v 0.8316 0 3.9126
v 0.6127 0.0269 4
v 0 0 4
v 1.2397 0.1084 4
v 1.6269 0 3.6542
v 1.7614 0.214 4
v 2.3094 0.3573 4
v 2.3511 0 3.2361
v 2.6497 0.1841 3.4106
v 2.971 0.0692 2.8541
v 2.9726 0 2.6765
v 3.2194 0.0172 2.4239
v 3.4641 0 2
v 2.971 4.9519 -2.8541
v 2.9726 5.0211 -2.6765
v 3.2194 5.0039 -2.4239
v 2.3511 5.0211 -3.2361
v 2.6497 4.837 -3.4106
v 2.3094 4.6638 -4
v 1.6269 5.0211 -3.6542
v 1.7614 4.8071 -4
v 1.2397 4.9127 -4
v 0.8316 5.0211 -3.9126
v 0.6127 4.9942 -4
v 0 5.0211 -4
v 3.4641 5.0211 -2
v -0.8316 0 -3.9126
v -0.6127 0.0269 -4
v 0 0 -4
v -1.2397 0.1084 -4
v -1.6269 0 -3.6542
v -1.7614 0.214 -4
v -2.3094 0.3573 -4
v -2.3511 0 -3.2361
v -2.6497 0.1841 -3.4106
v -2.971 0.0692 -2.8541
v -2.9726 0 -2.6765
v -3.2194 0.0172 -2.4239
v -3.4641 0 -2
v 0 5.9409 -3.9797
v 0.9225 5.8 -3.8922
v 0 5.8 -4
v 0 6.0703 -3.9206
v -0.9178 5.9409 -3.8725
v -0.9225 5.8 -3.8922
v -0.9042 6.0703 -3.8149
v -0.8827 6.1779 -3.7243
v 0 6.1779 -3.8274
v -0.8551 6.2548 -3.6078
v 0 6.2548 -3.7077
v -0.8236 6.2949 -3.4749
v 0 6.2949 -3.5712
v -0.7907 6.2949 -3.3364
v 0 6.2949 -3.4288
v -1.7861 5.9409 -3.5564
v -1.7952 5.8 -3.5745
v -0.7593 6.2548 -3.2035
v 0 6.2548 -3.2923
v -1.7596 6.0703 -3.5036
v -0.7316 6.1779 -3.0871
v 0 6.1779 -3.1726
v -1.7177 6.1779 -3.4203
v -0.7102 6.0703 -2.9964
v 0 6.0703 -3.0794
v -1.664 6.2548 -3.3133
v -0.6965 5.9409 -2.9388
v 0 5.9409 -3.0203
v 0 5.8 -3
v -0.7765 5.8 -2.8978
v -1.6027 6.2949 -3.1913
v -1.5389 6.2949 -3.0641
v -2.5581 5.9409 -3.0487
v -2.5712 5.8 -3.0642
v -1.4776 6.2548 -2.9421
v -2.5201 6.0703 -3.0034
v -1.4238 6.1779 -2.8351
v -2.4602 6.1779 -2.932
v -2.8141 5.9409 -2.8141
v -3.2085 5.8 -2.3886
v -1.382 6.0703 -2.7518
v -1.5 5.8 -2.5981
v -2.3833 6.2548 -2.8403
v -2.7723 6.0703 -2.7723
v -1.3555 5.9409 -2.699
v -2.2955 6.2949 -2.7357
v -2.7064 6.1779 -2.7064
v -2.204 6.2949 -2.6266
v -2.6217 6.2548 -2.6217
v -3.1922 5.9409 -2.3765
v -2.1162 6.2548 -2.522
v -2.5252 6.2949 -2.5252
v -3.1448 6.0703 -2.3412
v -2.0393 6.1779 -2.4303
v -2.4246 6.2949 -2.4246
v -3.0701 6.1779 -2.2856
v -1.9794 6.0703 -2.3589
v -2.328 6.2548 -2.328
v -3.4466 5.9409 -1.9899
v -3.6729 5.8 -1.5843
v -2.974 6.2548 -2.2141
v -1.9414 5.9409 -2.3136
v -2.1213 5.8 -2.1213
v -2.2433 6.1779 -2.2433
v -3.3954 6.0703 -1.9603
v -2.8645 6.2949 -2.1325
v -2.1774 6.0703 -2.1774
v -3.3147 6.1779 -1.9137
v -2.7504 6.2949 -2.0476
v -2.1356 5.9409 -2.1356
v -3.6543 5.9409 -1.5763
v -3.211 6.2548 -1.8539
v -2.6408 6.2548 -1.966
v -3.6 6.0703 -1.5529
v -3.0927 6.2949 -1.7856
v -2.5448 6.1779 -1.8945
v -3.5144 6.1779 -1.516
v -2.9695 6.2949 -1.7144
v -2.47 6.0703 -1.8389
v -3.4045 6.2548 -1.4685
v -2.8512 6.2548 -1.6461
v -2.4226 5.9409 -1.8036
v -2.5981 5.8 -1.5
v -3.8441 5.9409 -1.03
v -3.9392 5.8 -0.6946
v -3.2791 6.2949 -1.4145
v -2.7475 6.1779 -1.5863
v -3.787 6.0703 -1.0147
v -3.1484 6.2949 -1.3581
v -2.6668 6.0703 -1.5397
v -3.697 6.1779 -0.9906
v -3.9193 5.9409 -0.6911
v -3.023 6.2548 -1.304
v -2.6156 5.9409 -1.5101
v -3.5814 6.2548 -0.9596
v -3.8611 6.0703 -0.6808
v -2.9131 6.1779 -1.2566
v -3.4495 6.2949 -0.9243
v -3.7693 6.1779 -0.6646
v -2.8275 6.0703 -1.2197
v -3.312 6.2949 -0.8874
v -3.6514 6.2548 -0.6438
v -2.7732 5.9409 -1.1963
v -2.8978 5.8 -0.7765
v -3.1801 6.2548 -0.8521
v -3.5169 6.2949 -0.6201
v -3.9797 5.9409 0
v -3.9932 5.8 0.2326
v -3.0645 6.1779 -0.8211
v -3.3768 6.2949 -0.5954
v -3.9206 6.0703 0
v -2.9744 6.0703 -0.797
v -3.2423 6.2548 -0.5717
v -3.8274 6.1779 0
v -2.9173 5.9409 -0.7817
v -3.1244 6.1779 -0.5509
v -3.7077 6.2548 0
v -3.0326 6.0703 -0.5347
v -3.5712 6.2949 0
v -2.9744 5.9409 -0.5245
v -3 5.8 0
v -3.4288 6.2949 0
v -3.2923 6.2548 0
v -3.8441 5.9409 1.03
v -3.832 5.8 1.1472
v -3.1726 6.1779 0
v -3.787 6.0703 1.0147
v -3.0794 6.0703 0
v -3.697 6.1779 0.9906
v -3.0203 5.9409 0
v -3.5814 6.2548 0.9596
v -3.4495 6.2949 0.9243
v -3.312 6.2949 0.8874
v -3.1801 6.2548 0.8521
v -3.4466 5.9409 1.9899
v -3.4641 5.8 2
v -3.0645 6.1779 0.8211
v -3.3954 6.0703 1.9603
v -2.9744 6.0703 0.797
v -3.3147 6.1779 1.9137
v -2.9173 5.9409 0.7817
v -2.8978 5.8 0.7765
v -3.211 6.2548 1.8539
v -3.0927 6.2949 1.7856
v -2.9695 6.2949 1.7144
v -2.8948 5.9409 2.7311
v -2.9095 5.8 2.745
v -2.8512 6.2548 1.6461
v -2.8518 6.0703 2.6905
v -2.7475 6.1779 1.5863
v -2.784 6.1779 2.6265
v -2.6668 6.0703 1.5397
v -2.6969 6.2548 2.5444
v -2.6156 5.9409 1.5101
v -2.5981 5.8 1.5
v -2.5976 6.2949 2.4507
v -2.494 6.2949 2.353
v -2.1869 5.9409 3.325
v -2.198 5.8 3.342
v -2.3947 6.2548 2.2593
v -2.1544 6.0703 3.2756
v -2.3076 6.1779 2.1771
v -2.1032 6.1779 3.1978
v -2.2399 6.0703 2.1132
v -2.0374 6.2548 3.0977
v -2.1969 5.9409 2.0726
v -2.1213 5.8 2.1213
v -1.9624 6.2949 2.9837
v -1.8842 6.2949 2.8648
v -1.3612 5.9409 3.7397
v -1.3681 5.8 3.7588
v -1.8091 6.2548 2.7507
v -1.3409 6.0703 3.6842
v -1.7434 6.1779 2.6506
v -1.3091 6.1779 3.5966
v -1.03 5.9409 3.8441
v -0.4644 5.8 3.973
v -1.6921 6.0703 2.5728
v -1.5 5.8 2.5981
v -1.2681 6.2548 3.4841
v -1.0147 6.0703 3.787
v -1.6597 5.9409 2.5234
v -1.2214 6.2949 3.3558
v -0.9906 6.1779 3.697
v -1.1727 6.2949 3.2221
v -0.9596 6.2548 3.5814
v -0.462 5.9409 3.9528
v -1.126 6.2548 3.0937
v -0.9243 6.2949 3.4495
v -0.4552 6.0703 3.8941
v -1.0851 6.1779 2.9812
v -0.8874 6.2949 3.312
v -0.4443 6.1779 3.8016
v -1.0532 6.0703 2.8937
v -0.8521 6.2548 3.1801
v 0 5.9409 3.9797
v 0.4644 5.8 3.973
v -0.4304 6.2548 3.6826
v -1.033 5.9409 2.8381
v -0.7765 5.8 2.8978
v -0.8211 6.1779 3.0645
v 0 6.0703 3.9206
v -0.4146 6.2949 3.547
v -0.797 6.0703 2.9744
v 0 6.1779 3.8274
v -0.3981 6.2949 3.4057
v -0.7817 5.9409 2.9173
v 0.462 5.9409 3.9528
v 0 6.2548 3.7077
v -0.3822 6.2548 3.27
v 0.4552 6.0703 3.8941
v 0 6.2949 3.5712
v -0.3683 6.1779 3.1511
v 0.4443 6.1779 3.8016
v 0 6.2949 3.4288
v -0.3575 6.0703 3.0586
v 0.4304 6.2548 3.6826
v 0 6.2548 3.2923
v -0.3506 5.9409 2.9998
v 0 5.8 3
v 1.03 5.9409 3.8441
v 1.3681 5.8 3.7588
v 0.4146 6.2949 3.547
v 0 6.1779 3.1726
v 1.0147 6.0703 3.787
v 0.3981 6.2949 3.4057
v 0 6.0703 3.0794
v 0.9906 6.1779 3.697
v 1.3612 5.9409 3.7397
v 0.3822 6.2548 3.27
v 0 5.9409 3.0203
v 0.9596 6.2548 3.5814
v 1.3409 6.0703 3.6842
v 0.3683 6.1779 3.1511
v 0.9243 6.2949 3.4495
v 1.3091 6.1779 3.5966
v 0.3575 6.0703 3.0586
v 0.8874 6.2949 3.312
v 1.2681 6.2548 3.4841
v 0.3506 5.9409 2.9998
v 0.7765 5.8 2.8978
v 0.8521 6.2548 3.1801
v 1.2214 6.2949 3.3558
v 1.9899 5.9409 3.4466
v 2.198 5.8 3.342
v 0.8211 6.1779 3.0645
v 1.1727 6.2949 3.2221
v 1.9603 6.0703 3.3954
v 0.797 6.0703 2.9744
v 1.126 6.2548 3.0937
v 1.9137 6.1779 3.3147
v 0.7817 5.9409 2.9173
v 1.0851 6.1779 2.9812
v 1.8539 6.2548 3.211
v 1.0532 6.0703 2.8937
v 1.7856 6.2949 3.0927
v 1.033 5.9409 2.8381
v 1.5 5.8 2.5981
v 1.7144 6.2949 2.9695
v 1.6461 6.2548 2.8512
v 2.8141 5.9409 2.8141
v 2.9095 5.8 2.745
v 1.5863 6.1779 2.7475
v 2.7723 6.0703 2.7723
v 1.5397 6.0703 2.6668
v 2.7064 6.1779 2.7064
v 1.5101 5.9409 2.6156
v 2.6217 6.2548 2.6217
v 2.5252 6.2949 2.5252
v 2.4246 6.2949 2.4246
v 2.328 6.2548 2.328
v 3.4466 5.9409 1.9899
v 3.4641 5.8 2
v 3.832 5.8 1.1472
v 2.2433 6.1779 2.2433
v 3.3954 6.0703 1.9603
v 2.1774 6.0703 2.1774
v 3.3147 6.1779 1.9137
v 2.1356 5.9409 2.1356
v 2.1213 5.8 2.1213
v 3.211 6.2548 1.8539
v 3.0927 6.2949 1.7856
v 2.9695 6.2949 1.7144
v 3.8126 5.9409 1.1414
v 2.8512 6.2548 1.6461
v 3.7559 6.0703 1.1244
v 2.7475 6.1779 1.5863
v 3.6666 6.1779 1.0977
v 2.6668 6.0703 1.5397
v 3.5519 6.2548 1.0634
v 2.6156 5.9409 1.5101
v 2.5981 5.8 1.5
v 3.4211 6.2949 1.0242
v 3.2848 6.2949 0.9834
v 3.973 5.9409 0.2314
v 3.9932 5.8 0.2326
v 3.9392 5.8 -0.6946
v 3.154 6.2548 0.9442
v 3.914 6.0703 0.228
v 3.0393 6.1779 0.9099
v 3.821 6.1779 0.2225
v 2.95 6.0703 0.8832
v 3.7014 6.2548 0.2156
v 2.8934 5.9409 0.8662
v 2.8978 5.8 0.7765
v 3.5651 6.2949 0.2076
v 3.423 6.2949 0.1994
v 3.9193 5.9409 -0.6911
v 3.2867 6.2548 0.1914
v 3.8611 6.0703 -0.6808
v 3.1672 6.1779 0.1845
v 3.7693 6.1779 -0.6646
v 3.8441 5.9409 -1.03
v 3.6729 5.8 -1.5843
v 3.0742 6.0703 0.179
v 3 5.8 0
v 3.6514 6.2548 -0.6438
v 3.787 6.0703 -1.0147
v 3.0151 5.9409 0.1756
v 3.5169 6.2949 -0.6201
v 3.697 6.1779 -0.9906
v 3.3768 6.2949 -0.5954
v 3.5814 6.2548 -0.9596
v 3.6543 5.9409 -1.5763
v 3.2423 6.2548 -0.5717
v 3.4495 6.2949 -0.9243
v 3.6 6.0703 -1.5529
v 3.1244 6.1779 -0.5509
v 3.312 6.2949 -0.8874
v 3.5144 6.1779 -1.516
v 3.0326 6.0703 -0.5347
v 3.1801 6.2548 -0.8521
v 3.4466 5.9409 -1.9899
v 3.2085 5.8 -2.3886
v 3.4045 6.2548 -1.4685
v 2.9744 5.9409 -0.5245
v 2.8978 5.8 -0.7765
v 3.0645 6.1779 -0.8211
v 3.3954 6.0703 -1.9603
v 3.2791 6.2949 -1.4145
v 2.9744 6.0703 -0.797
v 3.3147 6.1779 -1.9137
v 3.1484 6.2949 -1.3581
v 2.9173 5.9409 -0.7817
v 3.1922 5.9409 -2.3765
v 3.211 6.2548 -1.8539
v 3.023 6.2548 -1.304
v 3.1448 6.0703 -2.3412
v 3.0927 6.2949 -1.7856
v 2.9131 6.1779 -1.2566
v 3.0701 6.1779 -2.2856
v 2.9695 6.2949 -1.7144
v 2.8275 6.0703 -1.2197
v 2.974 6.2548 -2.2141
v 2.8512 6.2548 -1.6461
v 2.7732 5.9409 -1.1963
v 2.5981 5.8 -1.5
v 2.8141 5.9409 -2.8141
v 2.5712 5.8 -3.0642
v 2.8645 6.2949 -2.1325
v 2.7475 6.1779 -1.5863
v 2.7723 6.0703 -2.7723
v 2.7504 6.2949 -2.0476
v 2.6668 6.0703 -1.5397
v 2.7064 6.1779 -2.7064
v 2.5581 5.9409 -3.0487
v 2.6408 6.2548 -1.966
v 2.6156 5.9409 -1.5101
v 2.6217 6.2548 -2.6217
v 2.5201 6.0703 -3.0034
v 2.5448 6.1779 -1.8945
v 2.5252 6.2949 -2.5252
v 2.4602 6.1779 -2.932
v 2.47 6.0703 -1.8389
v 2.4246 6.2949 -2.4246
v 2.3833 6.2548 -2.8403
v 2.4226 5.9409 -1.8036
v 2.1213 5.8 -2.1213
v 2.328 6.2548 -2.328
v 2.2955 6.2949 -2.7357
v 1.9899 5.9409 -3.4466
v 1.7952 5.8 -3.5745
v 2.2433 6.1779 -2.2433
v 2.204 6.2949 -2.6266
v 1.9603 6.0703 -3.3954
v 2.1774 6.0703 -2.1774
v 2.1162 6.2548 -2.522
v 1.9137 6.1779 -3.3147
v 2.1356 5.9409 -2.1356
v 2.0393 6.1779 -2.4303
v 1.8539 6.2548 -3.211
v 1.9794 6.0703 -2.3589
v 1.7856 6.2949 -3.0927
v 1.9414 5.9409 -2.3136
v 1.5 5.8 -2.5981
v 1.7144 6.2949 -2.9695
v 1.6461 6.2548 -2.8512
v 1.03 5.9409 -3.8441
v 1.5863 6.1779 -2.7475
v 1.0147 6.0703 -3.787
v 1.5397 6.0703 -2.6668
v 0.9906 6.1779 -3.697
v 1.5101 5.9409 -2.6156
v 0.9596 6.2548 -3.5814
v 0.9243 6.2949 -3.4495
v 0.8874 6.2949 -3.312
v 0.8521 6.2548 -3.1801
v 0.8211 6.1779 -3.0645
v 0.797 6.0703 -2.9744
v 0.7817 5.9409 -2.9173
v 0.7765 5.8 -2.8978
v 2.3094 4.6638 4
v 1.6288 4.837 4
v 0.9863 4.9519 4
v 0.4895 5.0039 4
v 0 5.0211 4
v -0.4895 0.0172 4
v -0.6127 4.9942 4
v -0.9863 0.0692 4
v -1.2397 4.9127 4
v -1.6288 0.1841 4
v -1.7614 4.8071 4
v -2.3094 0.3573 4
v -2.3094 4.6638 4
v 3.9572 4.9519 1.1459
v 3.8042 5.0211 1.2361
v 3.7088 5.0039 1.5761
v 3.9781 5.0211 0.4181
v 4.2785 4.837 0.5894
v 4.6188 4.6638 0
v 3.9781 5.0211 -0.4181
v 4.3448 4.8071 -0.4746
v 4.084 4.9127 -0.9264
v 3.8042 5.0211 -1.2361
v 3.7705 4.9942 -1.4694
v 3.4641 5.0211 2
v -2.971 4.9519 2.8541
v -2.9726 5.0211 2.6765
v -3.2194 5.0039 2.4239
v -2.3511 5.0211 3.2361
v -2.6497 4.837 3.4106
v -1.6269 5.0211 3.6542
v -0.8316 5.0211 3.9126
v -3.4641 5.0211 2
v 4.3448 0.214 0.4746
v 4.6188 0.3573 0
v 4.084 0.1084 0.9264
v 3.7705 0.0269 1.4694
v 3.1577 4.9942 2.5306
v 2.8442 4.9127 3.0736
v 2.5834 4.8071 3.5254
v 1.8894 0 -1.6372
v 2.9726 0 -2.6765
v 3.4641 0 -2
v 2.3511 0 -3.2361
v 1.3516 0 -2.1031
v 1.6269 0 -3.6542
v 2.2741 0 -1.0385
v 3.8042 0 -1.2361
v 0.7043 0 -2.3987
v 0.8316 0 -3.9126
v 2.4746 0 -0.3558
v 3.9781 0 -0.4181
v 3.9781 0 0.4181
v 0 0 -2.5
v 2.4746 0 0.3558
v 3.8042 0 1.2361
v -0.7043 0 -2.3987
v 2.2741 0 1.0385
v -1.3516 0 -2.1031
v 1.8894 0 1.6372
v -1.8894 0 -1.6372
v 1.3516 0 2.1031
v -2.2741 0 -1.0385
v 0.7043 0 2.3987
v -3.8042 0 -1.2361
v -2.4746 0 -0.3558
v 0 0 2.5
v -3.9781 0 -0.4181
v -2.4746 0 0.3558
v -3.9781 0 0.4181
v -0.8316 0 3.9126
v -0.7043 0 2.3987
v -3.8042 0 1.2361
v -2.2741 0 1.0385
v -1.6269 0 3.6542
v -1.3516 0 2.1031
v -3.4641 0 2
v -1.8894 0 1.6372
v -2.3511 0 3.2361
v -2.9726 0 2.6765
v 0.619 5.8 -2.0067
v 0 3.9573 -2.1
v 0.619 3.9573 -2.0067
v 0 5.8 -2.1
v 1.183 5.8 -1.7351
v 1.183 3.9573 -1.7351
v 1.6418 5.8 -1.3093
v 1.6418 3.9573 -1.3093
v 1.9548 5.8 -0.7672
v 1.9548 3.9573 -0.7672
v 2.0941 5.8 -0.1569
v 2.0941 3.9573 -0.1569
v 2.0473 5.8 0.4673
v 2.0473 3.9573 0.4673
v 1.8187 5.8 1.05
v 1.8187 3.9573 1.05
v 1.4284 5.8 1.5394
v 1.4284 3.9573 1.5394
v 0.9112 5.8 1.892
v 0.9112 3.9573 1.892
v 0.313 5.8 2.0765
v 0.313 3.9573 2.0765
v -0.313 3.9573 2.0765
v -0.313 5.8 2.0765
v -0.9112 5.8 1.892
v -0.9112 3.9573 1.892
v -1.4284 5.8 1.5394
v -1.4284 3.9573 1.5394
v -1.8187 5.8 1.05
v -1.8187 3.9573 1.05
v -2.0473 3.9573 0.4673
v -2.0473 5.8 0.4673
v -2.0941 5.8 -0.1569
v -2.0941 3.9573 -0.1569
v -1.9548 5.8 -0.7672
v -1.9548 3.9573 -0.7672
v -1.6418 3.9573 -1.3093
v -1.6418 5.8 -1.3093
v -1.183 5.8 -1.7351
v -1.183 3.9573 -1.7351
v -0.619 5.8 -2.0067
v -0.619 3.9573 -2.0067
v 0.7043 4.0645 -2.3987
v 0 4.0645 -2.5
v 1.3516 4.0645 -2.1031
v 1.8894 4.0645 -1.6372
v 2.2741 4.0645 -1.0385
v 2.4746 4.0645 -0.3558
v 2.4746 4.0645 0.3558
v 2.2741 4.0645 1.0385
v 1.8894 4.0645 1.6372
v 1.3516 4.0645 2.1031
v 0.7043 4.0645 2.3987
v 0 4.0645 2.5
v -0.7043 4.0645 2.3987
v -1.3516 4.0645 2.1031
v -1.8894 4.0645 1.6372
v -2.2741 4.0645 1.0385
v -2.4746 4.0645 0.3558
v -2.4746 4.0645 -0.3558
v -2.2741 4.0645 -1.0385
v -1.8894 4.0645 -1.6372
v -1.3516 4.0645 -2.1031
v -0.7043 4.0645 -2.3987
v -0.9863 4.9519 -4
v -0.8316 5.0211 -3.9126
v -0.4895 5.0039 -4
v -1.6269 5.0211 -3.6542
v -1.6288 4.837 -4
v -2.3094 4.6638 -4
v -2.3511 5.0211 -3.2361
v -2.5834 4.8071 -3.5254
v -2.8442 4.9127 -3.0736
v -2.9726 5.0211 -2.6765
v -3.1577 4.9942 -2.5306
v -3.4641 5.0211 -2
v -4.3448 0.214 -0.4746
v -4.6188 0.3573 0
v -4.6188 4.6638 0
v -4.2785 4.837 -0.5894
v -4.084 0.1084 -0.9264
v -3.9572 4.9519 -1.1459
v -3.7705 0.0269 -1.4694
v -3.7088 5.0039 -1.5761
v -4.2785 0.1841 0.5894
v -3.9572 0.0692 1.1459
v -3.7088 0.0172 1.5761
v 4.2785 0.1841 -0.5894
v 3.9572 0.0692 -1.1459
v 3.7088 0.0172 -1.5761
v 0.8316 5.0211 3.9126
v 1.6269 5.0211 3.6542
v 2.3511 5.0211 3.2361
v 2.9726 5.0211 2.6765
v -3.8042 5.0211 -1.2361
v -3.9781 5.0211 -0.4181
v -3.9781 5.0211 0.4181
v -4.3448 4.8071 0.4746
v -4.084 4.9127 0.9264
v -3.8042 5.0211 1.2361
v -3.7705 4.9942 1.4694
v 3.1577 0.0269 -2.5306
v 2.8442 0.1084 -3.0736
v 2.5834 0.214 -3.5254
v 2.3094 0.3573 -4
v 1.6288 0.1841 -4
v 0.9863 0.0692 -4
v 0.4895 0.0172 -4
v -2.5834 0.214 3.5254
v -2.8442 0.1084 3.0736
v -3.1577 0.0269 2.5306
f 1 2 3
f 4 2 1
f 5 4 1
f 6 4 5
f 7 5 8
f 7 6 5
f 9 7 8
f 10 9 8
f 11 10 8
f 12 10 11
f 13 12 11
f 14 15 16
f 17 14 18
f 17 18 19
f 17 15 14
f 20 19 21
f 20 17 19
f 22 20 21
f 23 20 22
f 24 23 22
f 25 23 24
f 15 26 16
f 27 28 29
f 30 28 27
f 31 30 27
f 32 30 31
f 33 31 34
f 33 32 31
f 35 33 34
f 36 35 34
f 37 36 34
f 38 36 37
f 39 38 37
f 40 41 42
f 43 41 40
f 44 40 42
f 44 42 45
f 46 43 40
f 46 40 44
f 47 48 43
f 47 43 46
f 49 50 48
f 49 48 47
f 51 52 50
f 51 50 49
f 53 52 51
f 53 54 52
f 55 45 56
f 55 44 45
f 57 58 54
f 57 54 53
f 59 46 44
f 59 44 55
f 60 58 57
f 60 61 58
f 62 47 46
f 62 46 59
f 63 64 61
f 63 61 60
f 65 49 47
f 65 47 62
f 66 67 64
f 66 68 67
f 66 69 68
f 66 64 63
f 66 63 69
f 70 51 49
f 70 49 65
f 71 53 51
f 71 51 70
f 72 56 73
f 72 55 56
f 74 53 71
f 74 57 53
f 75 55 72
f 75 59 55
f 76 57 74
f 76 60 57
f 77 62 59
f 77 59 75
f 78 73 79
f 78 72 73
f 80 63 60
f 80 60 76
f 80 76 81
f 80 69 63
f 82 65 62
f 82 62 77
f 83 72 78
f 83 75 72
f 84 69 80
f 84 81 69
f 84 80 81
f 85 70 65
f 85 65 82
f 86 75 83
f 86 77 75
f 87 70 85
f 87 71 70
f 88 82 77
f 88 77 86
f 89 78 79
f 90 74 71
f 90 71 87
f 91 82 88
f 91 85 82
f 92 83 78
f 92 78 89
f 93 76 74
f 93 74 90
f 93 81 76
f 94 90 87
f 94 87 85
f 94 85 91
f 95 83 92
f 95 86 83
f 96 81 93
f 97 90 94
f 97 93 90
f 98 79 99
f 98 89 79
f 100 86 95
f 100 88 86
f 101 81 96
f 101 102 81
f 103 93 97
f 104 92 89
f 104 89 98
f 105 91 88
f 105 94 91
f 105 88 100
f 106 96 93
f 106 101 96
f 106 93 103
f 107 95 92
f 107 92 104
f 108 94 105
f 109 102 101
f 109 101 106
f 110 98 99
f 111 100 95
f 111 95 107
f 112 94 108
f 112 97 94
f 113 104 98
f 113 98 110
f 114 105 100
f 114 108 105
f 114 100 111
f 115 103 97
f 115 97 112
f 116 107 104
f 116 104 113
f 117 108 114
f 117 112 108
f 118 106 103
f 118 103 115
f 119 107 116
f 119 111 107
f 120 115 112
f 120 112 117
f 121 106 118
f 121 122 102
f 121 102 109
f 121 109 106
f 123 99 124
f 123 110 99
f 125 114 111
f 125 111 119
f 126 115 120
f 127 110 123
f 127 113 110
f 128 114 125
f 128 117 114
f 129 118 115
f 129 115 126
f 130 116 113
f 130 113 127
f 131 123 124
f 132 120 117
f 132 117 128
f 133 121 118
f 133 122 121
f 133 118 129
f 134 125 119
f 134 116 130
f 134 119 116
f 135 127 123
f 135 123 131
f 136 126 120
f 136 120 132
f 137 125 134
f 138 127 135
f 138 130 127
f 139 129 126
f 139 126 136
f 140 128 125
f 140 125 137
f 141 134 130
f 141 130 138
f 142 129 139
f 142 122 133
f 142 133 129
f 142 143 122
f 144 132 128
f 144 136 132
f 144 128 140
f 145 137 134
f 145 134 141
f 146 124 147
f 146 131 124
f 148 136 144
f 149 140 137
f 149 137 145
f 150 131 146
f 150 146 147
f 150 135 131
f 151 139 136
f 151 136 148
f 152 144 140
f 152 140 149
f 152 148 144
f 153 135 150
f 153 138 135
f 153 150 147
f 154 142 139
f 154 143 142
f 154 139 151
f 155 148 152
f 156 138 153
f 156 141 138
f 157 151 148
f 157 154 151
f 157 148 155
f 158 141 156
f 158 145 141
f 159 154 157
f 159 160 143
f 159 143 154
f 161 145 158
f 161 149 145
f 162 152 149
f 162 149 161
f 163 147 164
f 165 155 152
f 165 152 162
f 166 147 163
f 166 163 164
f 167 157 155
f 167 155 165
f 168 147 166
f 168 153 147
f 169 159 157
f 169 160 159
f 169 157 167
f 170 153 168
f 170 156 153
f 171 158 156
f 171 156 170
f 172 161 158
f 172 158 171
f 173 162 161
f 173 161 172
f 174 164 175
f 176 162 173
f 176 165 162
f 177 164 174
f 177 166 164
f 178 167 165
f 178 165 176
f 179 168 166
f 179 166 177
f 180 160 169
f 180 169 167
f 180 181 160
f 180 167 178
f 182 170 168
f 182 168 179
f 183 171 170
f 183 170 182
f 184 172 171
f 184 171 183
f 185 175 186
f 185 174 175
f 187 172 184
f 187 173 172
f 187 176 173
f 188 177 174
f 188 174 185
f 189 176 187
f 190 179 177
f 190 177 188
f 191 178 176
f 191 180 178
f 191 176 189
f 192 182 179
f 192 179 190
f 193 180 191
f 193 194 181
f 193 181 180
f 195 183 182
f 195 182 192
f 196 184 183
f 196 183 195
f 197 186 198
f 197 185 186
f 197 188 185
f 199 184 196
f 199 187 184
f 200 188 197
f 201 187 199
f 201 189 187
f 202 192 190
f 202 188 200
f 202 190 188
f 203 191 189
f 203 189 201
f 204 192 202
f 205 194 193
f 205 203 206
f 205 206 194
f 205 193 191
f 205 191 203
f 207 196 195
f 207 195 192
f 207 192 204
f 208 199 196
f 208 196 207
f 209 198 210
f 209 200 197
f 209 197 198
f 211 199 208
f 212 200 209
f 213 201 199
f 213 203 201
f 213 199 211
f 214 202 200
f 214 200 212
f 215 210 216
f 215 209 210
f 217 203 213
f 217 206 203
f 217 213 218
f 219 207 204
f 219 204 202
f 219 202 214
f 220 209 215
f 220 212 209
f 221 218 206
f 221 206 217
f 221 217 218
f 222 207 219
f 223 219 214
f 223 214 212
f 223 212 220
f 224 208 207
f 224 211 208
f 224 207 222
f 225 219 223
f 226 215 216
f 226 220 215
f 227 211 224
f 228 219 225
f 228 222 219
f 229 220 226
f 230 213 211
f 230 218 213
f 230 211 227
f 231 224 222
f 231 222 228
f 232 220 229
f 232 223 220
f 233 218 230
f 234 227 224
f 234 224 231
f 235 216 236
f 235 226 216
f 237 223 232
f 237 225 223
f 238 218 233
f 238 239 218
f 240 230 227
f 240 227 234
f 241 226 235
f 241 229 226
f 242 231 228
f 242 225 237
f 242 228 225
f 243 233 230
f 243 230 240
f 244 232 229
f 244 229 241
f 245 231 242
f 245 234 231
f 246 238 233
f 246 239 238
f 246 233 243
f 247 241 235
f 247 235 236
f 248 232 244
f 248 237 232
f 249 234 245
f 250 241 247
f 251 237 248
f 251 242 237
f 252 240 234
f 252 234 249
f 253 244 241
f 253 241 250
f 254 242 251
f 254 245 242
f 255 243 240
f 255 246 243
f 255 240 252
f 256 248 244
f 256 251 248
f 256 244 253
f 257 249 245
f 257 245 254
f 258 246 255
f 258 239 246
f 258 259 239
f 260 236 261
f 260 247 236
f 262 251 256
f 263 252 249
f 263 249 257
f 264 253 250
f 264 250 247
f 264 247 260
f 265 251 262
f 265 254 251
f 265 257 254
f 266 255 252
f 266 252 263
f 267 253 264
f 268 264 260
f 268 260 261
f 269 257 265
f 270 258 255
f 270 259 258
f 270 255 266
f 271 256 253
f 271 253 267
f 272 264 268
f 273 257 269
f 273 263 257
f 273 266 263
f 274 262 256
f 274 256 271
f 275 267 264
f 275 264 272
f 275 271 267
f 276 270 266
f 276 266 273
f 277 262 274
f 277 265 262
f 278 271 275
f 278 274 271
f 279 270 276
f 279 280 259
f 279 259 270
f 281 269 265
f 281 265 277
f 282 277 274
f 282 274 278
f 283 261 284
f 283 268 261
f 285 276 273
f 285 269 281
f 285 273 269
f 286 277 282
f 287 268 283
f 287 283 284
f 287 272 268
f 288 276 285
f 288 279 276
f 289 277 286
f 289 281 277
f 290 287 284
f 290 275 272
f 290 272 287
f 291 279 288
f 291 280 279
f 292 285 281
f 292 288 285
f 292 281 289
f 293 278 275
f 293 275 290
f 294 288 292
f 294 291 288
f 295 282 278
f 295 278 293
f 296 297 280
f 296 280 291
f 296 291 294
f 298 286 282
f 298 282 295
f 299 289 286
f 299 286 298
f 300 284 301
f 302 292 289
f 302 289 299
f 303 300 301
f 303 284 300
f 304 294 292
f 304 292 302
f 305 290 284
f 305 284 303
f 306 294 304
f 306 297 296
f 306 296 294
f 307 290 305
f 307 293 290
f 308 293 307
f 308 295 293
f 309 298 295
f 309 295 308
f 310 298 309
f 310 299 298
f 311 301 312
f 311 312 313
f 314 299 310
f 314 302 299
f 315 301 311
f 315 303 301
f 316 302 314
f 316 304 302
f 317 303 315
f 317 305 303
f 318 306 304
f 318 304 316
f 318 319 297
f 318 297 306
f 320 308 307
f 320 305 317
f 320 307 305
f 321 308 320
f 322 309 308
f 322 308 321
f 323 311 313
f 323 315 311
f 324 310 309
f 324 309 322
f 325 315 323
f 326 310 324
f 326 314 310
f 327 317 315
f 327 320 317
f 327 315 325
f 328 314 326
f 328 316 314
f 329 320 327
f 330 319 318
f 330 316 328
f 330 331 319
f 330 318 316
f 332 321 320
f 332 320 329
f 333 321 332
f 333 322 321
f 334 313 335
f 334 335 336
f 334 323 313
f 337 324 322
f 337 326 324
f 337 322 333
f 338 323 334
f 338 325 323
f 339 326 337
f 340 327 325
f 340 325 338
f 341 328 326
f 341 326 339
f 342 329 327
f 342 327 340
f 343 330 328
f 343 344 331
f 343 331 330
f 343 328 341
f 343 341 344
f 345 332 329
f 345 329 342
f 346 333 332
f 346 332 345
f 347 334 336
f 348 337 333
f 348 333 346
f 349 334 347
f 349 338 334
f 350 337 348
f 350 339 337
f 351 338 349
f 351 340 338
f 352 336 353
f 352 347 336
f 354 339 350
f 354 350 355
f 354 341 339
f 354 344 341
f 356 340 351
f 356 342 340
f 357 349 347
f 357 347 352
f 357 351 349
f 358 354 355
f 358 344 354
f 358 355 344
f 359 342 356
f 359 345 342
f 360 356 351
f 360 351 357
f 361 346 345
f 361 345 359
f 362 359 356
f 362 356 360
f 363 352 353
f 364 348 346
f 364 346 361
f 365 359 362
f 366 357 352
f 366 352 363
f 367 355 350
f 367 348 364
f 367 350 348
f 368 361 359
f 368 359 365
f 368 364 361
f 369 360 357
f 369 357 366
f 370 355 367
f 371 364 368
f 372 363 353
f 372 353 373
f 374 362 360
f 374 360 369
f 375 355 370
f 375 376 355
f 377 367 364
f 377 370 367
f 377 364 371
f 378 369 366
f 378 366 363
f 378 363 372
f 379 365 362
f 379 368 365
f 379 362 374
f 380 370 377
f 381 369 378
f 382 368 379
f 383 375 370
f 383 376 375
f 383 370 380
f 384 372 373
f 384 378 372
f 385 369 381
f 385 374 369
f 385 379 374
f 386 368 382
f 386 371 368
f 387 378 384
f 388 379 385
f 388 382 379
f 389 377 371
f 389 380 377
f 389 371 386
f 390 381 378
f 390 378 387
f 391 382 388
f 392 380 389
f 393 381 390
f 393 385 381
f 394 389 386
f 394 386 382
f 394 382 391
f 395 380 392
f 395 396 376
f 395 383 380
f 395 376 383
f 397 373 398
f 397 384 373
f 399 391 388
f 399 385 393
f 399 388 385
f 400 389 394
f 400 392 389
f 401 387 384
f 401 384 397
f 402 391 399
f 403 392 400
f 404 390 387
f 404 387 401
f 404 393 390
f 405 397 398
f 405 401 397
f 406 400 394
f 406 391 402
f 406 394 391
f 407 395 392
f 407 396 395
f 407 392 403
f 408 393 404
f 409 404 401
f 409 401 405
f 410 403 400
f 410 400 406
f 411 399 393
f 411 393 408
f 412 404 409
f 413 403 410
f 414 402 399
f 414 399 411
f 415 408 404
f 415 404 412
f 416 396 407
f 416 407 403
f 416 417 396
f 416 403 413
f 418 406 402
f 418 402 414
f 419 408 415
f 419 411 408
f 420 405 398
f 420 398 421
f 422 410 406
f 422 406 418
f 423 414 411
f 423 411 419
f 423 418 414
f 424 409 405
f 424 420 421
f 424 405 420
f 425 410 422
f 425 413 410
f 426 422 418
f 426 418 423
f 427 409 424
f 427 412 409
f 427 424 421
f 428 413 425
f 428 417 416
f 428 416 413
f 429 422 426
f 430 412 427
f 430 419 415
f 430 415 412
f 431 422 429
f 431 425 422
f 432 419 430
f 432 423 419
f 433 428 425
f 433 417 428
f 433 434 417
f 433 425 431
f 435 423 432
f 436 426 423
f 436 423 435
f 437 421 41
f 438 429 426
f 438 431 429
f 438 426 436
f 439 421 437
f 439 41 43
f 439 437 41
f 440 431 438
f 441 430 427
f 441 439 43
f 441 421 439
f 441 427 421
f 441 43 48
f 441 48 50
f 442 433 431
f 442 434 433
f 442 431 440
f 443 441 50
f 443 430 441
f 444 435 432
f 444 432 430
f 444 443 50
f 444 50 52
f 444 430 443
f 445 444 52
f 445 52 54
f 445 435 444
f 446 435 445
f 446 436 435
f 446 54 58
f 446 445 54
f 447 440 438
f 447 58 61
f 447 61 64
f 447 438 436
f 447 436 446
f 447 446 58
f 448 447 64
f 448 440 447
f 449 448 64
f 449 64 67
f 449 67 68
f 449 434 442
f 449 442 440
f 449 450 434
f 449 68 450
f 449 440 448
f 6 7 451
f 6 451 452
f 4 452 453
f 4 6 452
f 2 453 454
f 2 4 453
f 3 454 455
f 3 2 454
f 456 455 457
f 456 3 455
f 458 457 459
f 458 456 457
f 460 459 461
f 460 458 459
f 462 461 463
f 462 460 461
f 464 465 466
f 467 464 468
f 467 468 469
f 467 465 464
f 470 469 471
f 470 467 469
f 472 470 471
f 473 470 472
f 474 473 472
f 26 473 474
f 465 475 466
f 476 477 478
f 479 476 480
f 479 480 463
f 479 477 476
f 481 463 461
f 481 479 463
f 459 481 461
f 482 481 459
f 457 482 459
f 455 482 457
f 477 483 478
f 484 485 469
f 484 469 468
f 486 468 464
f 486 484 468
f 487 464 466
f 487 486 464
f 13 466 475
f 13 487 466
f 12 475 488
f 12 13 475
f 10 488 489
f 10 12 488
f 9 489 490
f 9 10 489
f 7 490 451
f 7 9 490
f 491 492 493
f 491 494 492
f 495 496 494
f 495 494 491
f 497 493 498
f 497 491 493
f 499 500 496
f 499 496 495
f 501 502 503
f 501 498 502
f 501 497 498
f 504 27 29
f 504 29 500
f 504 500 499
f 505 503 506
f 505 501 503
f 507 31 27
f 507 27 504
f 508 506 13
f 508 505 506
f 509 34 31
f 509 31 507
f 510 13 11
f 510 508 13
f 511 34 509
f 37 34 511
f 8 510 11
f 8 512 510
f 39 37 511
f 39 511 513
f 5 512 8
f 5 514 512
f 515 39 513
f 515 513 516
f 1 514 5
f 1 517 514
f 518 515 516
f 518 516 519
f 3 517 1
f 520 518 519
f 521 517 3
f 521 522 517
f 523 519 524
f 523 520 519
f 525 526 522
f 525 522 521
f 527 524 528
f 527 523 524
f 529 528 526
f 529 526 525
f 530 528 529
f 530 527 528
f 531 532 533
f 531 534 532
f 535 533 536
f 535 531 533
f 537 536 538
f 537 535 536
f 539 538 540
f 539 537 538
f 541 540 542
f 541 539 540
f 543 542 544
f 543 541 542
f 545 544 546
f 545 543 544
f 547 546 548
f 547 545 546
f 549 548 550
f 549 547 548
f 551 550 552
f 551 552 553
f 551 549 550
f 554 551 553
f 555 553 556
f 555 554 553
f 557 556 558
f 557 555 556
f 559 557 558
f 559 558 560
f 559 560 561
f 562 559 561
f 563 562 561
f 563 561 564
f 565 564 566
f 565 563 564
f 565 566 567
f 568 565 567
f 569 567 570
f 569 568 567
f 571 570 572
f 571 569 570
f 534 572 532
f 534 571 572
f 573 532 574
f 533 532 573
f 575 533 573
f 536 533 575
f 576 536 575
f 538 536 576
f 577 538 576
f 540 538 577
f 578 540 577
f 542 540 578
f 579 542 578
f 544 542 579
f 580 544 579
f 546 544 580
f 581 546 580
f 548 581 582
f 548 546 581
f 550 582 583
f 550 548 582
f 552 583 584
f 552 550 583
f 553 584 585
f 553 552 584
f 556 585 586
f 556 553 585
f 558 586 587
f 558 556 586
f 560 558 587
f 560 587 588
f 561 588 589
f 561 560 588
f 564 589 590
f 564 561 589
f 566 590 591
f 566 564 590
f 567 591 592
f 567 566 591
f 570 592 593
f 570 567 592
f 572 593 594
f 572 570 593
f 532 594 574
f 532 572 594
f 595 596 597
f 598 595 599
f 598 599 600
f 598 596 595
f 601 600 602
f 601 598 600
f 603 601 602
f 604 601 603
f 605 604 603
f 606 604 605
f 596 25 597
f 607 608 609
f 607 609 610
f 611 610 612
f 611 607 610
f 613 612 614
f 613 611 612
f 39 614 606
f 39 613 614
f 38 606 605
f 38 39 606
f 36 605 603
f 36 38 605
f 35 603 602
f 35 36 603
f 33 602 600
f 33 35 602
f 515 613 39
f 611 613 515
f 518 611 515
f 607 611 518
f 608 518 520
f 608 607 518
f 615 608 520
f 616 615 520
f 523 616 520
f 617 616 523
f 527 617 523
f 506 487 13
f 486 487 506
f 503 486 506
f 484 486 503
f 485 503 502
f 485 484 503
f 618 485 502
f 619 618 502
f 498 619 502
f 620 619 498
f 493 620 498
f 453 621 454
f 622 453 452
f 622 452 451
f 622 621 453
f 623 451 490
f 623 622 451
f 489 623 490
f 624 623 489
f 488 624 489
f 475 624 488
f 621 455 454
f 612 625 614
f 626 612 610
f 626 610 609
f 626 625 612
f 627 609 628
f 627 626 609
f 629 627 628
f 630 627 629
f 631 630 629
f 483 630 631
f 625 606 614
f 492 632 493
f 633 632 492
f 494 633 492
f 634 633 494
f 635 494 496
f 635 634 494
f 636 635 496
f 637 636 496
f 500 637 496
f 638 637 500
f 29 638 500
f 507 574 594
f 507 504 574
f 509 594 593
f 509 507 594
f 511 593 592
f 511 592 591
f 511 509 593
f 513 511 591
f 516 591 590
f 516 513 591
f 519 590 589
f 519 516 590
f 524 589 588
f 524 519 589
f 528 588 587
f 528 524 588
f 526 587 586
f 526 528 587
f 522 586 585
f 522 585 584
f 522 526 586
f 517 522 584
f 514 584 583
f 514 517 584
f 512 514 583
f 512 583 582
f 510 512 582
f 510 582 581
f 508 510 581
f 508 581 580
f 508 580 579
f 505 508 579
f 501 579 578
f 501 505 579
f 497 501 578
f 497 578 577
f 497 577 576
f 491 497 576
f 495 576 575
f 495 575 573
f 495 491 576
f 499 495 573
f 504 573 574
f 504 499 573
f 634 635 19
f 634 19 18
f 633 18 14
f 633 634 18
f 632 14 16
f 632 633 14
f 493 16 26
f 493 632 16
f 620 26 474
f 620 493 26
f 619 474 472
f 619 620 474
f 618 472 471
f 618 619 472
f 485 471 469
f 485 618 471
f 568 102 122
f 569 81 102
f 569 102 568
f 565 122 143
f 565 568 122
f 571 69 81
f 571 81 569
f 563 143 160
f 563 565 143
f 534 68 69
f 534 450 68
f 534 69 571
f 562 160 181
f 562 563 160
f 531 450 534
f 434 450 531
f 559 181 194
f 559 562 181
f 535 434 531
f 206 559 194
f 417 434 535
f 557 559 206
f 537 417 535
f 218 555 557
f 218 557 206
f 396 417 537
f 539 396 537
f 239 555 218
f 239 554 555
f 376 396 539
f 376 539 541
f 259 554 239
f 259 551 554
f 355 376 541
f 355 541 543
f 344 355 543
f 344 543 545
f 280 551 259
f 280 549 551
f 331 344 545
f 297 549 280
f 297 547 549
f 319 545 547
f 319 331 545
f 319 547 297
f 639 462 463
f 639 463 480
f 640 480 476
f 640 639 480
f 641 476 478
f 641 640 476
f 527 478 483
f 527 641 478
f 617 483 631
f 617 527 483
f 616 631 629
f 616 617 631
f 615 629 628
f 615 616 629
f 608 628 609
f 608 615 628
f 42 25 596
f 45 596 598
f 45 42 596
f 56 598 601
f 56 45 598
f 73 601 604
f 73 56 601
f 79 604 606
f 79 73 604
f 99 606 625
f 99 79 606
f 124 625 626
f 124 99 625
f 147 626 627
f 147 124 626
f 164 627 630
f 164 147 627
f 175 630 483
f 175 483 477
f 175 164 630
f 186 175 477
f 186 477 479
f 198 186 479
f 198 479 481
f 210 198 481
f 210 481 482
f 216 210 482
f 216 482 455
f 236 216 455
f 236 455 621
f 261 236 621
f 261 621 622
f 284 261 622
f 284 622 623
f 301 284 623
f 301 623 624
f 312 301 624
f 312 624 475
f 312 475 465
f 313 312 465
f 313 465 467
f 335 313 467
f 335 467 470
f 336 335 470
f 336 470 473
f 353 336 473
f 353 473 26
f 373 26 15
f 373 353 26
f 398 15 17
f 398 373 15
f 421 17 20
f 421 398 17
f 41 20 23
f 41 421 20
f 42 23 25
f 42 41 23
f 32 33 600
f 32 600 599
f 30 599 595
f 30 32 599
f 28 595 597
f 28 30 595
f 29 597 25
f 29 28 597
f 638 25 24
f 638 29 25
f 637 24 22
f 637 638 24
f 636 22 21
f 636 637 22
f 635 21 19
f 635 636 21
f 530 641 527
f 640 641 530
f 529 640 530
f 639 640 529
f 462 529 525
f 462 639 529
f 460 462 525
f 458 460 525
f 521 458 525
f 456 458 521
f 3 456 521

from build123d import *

# Parameters (mm, degrees)
ESQUISSE2_OUTSIDE_W     = 16.754
ESQUISSE2_OUTSIDE_H     = 16.754
ENL_V_MAT_EXTRU_2_DEPTH = 7.3000001


with BuildPart() as part:
    # Esquisse1 → Base-Révolution (revolve)
    with BuildSketch(Plane.XY, mode=Mode.PRIVATE) as base_r_volution_sk:
        with BuildLine():
            Line((3, 5.800000004), (3.499999996, 5.800000004))
            Line((3.499999996, 5.800000004), (3.499999996, 4.33246532))
            Line((3.499999996, 4.33246532), (2.5, 4.064516129))
            Line((2.5, 4.064516129), (2.5, 0))
            Line((2.5, 0), (4, 0))
            Line((4, 0), (5.656854249, 0.956585264))
            Line((5.656854249, 0.956585264), (5.656854249, 4.064516129))
            Line((5.656854249, 4.064516129), (3.999999993, 5.02110138))
            Line((3.999999993, 5.02110138), (3.999999993, 5.800000004))
            ThreePointArc((3.999999993, 5.800000004), (3.499999996, 6.3), (3, 5.800000004))
        make_face()
    revolve(base_r_volution_sk.sketch.rotate(Axis((0, 0, 0), (0, 1, 0)), 90), axis=Axis((0, 0, 0), (0, 1, 0)))  # turned: the seam where the file's is

    # Esquisse2 outside → Enlèv. mat.-Extru.2 (cut, through all)
    with BuildSketch(Plane(origin=(0, 0, 0), x_dir=(1, 0, 0), z_dir=(0, 1, 0))):
        Rectangle(ESQUISSE2_OUTSIDE_W, ESQUISSE2_OUTSIDE_H)
        Polygon((-2.309401077, 4), (2.309401077, 4), (4.618802154, 0), (2.309401077, -4), (-2.309401077, -4), (-4.618802154, 0), align=None, mode=Mode.SUBTRACT)
    extrude(amount=ENL_V_MAT_EXTRU_2_DEPTH, mode=Mode.SUBTRACT)

    # Esquisse4 → Boss.-Révol.1 (revolve)
    with BuildSketch(Plane.XY, mode=Mode.PRIVATE) as boss_r_vol_1_sk:
        Polygon((2.1, 3.957336452), (2.1, 5.800000004), (3.499999996, 5.800000004), (3.499999996, 4.33246532), align=None)
    revolve(boss_r_vol_1_sk.sketch.rotate(Axis((0, 5.02110138, 0), (0, -1, 0)), 270), axis=Axis((0, 5.02110138, 0), (0, -1, 0)))  # turned: the seam where the file's is


solid = part.part
